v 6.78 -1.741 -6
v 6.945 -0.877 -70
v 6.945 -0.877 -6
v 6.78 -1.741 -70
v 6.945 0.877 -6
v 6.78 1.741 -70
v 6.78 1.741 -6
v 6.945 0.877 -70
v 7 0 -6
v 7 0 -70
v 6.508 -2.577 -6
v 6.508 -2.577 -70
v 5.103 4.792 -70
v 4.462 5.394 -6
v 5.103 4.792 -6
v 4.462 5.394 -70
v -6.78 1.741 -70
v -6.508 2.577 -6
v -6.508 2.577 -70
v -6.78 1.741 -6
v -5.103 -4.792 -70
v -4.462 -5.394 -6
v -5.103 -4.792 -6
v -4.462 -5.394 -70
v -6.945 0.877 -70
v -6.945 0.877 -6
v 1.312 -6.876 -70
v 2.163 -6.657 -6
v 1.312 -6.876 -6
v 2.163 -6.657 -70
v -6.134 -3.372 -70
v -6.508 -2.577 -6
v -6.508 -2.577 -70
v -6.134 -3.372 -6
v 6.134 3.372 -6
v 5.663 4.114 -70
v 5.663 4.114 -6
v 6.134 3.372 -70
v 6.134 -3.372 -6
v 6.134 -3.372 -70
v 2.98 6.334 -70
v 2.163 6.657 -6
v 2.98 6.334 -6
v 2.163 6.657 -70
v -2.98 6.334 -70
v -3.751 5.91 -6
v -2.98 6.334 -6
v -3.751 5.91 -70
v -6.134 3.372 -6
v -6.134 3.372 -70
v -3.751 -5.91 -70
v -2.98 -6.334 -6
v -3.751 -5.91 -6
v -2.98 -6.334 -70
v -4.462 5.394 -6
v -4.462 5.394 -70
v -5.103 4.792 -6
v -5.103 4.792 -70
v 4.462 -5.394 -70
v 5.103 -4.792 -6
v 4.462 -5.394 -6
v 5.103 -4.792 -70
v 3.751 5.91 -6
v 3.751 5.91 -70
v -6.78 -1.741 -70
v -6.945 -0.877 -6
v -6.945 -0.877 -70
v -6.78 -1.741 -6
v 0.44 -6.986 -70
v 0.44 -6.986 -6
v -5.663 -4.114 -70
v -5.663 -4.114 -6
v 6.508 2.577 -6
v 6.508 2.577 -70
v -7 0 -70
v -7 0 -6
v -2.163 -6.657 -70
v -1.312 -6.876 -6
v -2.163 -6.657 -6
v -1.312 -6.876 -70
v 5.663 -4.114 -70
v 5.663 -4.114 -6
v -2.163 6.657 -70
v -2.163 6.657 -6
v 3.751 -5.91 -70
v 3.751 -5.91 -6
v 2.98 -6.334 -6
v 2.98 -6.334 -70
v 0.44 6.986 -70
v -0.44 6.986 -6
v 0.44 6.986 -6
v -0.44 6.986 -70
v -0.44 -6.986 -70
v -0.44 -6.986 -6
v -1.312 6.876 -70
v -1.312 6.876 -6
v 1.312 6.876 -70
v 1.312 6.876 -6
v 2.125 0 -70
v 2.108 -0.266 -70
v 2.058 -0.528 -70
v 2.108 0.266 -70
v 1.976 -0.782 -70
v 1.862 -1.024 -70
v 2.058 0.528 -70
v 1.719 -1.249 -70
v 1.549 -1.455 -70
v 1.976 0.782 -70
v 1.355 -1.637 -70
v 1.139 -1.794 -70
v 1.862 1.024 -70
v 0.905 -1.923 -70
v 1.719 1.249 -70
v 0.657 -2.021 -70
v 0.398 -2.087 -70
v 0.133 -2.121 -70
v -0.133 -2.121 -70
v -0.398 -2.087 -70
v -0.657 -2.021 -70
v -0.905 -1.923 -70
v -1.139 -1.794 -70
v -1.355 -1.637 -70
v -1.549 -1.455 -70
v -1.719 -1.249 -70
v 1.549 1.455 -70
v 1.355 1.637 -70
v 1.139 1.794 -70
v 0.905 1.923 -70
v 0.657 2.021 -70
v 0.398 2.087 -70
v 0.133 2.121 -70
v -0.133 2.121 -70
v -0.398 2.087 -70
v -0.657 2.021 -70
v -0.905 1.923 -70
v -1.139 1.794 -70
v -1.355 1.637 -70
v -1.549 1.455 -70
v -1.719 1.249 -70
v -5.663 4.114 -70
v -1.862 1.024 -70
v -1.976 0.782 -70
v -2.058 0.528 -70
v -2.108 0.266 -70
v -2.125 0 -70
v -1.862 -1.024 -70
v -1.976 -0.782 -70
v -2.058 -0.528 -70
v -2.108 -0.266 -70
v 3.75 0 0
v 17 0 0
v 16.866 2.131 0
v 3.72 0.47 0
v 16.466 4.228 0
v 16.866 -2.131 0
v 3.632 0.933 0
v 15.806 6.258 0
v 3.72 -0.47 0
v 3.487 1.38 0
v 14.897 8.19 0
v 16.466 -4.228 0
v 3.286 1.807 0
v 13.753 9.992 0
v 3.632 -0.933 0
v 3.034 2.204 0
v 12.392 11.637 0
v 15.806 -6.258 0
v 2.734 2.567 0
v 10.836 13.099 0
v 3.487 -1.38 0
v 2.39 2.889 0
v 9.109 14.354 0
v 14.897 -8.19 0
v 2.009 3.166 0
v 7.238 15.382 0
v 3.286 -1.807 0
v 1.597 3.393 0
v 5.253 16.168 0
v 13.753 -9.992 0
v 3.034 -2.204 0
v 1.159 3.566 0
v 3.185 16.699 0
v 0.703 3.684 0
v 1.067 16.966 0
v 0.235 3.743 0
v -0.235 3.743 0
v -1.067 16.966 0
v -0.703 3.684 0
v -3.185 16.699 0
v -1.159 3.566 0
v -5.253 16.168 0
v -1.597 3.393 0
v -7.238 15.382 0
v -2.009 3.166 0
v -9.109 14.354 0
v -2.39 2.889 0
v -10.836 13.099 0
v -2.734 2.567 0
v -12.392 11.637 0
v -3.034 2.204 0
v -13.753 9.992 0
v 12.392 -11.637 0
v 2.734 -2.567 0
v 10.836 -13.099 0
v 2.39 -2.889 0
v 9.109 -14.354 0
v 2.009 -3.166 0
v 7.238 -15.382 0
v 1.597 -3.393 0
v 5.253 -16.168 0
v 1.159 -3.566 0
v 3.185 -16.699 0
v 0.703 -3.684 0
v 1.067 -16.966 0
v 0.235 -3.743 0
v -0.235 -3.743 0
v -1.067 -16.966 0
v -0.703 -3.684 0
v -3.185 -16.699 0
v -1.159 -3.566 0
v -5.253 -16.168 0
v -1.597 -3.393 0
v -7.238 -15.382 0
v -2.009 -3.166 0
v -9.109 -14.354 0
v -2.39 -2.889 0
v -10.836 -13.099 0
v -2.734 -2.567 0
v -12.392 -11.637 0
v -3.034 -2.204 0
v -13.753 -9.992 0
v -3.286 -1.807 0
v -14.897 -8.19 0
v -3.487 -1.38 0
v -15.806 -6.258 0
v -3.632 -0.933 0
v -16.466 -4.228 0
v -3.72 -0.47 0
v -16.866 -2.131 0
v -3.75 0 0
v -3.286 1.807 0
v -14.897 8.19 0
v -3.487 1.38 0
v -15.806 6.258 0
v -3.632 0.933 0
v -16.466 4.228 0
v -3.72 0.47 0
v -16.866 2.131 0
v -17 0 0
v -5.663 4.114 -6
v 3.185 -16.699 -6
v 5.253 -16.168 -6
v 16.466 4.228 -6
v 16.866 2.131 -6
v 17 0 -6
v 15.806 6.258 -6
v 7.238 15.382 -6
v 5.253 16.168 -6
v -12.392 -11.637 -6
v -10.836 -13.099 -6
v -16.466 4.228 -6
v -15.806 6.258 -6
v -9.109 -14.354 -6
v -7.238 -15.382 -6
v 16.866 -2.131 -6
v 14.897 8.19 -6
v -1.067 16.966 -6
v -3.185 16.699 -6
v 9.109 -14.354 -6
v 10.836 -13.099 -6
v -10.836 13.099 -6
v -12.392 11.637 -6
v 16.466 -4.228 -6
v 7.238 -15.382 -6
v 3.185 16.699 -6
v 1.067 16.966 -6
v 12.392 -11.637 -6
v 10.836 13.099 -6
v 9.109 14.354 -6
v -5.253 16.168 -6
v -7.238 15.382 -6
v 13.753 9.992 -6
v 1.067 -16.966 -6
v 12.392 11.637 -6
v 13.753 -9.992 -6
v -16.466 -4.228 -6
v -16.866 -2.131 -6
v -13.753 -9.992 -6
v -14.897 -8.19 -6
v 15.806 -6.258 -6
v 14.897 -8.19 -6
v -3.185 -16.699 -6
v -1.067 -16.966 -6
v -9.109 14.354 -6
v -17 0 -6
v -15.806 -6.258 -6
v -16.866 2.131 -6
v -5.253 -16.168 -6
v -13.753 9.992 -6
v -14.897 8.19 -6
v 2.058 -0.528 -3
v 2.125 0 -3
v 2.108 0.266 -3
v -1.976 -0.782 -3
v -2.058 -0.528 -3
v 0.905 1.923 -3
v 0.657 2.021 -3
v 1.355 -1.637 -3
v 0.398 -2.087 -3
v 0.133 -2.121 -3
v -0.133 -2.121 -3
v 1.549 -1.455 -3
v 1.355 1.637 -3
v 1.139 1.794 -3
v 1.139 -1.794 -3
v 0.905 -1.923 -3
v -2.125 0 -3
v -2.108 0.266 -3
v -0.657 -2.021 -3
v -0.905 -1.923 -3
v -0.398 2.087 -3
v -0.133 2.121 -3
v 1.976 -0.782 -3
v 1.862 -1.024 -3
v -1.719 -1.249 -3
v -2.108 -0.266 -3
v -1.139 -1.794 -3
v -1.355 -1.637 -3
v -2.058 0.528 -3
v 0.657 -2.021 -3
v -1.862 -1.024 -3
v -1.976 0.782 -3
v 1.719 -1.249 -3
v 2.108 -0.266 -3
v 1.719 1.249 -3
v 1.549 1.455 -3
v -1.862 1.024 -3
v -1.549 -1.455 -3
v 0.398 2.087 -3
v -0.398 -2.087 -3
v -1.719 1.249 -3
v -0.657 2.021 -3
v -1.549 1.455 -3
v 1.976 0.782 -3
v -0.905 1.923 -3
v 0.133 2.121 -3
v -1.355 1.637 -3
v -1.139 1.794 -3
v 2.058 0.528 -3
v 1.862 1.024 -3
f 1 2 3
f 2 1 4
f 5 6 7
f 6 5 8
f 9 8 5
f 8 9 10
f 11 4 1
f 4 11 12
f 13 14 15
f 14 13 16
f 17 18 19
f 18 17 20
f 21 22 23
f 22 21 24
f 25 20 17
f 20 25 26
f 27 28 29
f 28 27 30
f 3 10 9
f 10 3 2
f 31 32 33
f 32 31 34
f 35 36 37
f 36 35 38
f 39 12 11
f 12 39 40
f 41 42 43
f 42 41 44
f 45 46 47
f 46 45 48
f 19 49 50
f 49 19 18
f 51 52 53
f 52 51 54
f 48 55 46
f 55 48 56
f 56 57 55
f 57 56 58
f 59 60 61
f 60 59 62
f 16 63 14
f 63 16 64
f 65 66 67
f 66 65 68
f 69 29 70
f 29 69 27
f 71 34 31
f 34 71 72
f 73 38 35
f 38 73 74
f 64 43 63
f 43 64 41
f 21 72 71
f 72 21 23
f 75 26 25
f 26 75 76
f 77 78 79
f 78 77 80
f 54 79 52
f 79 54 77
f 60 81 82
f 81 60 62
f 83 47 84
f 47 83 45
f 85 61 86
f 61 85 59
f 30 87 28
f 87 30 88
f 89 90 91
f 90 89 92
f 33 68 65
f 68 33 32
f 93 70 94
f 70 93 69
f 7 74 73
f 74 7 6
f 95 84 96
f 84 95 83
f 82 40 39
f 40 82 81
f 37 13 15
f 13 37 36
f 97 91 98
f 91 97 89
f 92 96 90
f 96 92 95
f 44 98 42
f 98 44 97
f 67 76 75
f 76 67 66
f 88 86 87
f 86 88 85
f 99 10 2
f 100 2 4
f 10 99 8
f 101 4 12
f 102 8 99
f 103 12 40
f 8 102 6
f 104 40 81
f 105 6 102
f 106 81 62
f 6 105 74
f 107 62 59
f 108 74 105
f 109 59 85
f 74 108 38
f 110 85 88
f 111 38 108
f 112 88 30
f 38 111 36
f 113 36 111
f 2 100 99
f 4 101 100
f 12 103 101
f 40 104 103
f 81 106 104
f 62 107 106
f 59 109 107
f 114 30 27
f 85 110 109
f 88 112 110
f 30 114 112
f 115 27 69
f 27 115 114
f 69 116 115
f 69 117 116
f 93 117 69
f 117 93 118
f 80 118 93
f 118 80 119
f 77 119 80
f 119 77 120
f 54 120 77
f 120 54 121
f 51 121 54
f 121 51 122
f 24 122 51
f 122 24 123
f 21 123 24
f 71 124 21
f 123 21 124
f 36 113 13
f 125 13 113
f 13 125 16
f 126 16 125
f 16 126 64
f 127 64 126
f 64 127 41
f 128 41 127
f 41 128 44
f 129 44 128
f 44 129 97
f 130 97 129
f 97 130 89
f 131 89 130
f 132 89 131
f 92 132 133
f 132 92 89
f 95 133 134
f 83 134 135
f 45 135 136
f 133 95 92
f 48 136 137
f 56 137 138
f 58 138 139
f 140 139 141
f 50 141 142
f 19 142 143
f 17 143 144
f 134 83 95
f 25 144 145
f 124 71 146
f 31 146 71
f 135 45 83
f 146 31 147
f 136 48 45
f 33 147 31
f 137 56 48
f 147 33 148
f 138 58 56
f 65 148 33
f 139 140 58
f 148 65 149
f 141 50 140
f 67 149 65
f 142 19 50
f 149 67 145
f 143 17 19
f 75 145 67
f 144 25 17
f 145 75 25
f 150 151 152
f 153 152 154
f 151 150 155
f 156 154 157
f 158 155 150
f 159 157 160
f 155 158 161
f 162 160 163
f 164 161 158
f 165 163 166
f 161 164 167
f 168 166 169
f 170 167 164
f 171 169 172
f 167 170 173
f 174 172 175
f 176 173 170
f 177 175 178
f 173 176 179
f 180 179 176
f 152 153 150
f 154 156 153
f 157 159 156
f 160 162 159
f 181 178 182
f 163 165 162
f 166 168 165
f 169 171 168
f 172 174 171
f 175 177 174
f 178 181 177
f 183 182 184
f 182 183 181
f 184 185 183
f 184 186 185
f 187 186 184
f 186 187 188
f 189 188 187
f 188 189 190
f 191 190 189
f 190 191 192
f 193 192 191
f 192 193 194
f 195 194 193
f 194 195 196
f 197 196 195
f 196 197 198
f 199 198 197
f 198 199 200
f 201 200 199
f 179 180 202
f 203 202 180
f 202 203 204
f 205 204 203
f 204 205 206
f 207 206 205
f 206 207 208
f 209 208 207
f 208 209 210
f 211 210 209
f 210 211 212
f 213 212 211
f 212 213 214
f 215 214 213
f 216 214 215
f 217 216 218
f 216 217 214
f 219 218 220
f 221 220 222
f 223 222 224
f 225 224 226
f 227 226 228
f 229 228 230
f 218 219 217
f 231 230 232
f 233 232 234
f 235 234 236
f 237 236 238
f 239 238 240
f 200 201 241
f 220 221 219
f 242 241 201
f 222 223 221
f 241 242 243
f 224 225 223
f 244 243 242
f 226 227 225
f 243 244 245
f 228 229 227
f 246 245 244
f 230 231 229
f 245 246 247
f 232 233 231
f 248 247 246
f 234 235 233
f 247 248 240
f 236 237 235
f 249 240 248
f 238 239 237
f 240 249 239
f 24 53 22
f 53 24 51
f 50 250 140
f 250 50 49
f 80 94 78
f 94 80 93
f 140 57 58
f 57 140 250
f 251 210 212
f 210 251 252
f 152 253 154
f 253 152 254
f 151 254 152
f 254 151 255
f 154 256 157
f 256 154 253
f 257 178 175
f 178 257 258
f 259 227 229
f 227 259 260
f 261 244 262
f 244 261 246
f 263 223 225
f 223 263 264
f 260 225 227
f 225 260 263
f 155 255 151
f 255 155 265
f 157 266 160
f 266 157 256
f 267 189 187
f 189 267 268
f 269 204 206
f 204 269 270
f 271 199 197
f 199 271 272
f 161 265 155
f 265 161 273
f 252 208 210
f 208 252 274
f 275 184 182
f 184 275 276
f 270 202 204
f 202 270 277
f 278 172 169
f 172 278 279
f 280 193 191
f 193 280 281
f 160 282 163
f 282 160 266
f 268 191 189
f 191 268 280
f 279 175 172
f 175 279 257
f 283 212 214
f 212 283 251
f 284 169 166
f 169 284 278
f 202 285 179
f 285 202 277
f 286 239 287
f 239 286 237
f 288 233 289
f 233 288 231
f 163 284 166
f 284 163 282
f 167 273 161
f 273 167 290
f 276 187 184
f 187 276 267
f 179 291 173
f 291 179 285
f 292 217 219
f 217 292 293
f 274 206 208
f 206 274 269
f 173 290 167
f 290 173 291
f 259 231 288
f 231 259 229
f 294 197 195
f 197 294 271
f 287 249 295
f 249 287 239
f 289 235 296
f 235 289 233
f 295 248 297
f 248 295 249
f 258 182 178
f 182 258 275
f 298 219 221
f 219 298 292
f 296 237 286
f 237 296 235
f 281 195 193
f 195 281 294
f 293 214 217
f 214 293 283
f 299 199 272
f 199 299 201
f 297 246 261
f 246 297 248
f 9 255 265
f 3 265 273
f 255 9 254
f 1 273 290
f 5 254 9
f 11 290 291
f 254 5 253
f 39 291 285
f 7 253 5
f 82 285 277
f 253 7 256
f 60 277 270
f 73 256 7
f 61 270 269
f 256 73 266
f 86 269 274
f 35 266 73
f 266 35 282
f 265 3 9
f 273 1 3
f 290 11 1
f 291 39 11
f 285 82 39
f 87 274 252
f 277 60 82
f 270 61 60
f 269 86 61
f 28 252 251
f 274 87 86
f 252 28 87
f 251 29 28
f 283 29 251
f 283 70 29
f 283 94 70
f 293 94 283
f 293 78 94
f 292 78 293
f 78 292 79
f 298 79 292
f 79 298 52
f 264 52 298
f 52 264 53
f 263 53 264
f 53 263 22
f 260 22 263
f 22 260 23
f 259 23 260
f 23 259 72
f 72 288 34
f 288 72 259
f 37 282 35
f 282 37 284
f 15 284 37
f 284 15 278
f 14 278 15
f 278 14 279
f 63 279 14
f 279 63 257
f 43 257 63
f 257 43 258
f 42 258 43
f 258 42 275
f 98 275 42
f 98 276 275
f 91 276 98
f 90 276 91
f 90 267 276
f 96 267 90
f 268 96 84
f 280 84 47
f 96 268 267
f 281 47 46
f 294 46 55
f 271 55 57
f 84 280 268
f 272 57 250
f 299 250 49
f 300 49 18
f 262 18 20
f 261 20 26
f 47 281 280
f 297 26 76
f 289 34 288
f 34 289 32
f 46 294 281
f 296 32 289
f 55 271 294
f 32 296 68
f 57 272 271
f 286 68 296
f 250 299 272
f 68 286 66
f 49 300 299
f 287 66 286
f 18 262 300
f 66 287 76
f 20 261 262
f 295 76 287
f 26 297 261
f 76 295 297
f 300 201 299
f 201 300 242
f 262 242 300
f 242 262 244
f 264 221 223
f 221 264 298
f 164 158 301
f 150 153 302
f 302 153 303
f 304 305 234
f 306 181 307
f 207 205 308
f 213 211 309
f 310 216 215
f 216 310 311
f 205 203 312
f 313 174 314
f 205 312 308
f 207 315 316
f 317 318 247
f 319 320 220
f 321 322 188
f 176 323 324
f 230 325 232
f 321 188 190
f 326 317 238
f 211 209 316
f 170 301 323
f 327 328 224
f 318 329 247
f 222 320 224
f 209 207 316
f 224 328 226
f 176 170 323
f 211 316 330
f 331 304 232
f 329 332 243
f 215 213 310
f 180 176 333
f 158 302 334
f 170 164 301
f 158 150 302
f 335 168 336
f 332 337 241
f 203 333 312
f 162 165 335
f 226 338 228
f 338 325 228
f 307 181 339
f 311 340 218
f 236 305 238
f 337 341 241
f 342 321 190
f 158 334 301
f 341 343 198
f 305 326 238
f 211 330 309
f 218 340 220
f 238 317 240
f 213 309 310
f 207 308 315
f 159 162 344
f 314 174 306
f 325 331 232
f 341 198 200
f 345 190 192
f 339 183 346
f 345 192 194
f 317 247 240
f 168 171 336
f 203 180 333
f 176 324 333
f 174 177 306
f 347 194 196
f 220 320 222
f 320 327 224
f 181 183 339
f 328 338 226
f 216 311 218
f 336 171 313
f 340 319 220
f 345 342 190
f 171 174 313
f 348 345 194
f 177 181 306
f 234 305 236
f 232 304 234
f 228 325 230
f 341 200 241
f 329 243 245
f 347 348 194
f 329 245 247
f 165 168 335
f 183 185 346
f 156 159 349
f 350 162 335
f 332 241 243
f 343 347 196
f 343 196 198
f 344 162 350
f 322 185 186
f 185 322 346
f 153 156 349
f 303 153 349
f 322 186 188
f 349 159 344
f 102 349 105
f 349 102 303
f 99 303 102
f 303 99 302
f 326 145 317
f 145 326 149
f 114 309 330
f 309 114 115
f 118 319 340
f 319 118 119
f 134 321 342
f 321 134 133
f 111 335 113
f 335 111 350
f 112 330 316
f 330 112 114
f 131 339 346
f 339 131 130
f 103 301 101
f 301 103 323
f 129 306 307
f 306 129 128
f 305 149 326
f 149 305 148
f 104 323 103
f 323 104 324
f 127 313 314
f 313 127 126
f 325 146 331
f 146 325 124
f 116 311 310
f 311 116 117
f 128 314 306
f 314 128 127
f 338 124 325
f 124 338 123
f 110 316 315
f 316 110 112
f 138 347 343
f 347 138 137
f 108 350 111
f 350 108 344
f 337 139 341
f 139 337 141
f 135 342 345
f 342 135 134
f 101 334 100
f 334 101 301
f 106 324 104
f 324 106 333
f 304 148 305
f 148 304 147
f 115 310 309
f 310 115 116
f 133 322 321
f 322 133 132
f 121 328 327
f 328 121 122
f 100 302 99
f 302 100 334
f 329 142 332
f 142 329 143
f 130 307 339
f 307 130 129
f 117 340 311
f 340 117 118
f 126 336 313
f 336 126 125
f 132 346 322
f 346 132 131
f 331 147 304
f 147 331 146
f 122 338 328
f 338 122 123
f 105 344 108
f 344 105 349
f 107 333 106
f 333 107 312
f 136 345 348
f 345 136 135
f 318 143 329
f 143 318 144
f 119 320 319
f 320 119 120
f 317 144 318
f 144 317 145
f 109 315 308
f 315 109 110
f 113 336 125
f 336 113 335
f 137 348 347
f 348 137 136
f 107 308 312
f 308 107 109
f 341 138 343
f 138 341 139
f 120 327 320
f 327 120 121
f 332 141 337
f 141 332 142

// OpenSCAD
$fn = 50;


difference() {
	union() {
		translate(v = [0, 0, -70.0000000000]) {
			cylinder(h = 70, r = 7.0000000000);
		}
		translate(v = [0, 0, -6.0000000000]) {
			cylinder(h = 6, r = 17.0000000000);
		}
	}
	union() {
		translate(v = [0, 0, 0]) {
			rotate(a = [0, 0, 0]) {
				difference() {
					union() {
						#translate(v = [0, 0, -70.0000000000]) {
							cylinder(h = 70, r = 2.0000000000);
						}
						#translate(v = [0, 0, -3]) {
							cylinder(h = 3, r = 7.0000000000, r1 = 2.1250000000, r2 = 3.7500000000);
						}
						#translate(v = [0, 0, -70.0000000000]) {
							cylinder(h = 70, r = 2.1250000000);
						}
						#translate(v = [0, 0, -70.0000000000]) {
							cylinder(h = 70, r = 2.0000000000);
						}
					}
					union();
				}
			}
		}
	}
}
